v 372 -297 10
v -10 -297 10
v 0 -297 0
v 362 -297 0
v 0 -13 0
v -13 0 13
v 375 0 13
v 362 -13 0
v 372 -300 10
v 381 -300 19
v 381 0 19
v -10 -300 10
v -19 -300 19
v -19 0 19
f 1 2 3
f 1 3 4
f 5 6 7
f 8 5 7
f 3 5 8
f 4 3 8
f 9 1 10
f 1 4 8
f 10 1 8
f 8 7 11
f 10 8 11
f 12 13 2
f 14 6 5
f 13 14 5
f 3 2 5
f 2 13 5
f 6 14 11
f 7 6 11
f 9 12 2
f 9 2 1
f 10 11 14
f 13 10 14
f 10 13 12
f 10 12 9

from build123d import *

# Parameters (mm, degrees)
F1_DEPTH = 300
F2_SIZE  = 13
F3_W     = 400
F3_H     = 10
F4_DEPTH = 3


with BuildPart() as f1:
    # F0 (on Front) → F1 (new body)
    with BuildSketch(Plane.XZ):
        Polygon((-19, 19), (0, 0), (362, 0), (381, 19), align=None)
    extrude(amount=F1_DEPTH)

    # F2
    f2_edges = [f1.edges().sort_by_distance(p)[0] for p in [
        (181, 0, 0),
    ]]
    chamfer(f2_edges, length=F2_SIZE)

    # F3 (on face) → F4 (cut)
    with BuildSketch(Plane.XZ.offset(300)):
        with Locations((180, 5)):
            Rectangle(F3_W, F3_H)
    extrude(amount=-F4_DEPTH, mode=Mode.SUBTRACT)


solid = f1.part
